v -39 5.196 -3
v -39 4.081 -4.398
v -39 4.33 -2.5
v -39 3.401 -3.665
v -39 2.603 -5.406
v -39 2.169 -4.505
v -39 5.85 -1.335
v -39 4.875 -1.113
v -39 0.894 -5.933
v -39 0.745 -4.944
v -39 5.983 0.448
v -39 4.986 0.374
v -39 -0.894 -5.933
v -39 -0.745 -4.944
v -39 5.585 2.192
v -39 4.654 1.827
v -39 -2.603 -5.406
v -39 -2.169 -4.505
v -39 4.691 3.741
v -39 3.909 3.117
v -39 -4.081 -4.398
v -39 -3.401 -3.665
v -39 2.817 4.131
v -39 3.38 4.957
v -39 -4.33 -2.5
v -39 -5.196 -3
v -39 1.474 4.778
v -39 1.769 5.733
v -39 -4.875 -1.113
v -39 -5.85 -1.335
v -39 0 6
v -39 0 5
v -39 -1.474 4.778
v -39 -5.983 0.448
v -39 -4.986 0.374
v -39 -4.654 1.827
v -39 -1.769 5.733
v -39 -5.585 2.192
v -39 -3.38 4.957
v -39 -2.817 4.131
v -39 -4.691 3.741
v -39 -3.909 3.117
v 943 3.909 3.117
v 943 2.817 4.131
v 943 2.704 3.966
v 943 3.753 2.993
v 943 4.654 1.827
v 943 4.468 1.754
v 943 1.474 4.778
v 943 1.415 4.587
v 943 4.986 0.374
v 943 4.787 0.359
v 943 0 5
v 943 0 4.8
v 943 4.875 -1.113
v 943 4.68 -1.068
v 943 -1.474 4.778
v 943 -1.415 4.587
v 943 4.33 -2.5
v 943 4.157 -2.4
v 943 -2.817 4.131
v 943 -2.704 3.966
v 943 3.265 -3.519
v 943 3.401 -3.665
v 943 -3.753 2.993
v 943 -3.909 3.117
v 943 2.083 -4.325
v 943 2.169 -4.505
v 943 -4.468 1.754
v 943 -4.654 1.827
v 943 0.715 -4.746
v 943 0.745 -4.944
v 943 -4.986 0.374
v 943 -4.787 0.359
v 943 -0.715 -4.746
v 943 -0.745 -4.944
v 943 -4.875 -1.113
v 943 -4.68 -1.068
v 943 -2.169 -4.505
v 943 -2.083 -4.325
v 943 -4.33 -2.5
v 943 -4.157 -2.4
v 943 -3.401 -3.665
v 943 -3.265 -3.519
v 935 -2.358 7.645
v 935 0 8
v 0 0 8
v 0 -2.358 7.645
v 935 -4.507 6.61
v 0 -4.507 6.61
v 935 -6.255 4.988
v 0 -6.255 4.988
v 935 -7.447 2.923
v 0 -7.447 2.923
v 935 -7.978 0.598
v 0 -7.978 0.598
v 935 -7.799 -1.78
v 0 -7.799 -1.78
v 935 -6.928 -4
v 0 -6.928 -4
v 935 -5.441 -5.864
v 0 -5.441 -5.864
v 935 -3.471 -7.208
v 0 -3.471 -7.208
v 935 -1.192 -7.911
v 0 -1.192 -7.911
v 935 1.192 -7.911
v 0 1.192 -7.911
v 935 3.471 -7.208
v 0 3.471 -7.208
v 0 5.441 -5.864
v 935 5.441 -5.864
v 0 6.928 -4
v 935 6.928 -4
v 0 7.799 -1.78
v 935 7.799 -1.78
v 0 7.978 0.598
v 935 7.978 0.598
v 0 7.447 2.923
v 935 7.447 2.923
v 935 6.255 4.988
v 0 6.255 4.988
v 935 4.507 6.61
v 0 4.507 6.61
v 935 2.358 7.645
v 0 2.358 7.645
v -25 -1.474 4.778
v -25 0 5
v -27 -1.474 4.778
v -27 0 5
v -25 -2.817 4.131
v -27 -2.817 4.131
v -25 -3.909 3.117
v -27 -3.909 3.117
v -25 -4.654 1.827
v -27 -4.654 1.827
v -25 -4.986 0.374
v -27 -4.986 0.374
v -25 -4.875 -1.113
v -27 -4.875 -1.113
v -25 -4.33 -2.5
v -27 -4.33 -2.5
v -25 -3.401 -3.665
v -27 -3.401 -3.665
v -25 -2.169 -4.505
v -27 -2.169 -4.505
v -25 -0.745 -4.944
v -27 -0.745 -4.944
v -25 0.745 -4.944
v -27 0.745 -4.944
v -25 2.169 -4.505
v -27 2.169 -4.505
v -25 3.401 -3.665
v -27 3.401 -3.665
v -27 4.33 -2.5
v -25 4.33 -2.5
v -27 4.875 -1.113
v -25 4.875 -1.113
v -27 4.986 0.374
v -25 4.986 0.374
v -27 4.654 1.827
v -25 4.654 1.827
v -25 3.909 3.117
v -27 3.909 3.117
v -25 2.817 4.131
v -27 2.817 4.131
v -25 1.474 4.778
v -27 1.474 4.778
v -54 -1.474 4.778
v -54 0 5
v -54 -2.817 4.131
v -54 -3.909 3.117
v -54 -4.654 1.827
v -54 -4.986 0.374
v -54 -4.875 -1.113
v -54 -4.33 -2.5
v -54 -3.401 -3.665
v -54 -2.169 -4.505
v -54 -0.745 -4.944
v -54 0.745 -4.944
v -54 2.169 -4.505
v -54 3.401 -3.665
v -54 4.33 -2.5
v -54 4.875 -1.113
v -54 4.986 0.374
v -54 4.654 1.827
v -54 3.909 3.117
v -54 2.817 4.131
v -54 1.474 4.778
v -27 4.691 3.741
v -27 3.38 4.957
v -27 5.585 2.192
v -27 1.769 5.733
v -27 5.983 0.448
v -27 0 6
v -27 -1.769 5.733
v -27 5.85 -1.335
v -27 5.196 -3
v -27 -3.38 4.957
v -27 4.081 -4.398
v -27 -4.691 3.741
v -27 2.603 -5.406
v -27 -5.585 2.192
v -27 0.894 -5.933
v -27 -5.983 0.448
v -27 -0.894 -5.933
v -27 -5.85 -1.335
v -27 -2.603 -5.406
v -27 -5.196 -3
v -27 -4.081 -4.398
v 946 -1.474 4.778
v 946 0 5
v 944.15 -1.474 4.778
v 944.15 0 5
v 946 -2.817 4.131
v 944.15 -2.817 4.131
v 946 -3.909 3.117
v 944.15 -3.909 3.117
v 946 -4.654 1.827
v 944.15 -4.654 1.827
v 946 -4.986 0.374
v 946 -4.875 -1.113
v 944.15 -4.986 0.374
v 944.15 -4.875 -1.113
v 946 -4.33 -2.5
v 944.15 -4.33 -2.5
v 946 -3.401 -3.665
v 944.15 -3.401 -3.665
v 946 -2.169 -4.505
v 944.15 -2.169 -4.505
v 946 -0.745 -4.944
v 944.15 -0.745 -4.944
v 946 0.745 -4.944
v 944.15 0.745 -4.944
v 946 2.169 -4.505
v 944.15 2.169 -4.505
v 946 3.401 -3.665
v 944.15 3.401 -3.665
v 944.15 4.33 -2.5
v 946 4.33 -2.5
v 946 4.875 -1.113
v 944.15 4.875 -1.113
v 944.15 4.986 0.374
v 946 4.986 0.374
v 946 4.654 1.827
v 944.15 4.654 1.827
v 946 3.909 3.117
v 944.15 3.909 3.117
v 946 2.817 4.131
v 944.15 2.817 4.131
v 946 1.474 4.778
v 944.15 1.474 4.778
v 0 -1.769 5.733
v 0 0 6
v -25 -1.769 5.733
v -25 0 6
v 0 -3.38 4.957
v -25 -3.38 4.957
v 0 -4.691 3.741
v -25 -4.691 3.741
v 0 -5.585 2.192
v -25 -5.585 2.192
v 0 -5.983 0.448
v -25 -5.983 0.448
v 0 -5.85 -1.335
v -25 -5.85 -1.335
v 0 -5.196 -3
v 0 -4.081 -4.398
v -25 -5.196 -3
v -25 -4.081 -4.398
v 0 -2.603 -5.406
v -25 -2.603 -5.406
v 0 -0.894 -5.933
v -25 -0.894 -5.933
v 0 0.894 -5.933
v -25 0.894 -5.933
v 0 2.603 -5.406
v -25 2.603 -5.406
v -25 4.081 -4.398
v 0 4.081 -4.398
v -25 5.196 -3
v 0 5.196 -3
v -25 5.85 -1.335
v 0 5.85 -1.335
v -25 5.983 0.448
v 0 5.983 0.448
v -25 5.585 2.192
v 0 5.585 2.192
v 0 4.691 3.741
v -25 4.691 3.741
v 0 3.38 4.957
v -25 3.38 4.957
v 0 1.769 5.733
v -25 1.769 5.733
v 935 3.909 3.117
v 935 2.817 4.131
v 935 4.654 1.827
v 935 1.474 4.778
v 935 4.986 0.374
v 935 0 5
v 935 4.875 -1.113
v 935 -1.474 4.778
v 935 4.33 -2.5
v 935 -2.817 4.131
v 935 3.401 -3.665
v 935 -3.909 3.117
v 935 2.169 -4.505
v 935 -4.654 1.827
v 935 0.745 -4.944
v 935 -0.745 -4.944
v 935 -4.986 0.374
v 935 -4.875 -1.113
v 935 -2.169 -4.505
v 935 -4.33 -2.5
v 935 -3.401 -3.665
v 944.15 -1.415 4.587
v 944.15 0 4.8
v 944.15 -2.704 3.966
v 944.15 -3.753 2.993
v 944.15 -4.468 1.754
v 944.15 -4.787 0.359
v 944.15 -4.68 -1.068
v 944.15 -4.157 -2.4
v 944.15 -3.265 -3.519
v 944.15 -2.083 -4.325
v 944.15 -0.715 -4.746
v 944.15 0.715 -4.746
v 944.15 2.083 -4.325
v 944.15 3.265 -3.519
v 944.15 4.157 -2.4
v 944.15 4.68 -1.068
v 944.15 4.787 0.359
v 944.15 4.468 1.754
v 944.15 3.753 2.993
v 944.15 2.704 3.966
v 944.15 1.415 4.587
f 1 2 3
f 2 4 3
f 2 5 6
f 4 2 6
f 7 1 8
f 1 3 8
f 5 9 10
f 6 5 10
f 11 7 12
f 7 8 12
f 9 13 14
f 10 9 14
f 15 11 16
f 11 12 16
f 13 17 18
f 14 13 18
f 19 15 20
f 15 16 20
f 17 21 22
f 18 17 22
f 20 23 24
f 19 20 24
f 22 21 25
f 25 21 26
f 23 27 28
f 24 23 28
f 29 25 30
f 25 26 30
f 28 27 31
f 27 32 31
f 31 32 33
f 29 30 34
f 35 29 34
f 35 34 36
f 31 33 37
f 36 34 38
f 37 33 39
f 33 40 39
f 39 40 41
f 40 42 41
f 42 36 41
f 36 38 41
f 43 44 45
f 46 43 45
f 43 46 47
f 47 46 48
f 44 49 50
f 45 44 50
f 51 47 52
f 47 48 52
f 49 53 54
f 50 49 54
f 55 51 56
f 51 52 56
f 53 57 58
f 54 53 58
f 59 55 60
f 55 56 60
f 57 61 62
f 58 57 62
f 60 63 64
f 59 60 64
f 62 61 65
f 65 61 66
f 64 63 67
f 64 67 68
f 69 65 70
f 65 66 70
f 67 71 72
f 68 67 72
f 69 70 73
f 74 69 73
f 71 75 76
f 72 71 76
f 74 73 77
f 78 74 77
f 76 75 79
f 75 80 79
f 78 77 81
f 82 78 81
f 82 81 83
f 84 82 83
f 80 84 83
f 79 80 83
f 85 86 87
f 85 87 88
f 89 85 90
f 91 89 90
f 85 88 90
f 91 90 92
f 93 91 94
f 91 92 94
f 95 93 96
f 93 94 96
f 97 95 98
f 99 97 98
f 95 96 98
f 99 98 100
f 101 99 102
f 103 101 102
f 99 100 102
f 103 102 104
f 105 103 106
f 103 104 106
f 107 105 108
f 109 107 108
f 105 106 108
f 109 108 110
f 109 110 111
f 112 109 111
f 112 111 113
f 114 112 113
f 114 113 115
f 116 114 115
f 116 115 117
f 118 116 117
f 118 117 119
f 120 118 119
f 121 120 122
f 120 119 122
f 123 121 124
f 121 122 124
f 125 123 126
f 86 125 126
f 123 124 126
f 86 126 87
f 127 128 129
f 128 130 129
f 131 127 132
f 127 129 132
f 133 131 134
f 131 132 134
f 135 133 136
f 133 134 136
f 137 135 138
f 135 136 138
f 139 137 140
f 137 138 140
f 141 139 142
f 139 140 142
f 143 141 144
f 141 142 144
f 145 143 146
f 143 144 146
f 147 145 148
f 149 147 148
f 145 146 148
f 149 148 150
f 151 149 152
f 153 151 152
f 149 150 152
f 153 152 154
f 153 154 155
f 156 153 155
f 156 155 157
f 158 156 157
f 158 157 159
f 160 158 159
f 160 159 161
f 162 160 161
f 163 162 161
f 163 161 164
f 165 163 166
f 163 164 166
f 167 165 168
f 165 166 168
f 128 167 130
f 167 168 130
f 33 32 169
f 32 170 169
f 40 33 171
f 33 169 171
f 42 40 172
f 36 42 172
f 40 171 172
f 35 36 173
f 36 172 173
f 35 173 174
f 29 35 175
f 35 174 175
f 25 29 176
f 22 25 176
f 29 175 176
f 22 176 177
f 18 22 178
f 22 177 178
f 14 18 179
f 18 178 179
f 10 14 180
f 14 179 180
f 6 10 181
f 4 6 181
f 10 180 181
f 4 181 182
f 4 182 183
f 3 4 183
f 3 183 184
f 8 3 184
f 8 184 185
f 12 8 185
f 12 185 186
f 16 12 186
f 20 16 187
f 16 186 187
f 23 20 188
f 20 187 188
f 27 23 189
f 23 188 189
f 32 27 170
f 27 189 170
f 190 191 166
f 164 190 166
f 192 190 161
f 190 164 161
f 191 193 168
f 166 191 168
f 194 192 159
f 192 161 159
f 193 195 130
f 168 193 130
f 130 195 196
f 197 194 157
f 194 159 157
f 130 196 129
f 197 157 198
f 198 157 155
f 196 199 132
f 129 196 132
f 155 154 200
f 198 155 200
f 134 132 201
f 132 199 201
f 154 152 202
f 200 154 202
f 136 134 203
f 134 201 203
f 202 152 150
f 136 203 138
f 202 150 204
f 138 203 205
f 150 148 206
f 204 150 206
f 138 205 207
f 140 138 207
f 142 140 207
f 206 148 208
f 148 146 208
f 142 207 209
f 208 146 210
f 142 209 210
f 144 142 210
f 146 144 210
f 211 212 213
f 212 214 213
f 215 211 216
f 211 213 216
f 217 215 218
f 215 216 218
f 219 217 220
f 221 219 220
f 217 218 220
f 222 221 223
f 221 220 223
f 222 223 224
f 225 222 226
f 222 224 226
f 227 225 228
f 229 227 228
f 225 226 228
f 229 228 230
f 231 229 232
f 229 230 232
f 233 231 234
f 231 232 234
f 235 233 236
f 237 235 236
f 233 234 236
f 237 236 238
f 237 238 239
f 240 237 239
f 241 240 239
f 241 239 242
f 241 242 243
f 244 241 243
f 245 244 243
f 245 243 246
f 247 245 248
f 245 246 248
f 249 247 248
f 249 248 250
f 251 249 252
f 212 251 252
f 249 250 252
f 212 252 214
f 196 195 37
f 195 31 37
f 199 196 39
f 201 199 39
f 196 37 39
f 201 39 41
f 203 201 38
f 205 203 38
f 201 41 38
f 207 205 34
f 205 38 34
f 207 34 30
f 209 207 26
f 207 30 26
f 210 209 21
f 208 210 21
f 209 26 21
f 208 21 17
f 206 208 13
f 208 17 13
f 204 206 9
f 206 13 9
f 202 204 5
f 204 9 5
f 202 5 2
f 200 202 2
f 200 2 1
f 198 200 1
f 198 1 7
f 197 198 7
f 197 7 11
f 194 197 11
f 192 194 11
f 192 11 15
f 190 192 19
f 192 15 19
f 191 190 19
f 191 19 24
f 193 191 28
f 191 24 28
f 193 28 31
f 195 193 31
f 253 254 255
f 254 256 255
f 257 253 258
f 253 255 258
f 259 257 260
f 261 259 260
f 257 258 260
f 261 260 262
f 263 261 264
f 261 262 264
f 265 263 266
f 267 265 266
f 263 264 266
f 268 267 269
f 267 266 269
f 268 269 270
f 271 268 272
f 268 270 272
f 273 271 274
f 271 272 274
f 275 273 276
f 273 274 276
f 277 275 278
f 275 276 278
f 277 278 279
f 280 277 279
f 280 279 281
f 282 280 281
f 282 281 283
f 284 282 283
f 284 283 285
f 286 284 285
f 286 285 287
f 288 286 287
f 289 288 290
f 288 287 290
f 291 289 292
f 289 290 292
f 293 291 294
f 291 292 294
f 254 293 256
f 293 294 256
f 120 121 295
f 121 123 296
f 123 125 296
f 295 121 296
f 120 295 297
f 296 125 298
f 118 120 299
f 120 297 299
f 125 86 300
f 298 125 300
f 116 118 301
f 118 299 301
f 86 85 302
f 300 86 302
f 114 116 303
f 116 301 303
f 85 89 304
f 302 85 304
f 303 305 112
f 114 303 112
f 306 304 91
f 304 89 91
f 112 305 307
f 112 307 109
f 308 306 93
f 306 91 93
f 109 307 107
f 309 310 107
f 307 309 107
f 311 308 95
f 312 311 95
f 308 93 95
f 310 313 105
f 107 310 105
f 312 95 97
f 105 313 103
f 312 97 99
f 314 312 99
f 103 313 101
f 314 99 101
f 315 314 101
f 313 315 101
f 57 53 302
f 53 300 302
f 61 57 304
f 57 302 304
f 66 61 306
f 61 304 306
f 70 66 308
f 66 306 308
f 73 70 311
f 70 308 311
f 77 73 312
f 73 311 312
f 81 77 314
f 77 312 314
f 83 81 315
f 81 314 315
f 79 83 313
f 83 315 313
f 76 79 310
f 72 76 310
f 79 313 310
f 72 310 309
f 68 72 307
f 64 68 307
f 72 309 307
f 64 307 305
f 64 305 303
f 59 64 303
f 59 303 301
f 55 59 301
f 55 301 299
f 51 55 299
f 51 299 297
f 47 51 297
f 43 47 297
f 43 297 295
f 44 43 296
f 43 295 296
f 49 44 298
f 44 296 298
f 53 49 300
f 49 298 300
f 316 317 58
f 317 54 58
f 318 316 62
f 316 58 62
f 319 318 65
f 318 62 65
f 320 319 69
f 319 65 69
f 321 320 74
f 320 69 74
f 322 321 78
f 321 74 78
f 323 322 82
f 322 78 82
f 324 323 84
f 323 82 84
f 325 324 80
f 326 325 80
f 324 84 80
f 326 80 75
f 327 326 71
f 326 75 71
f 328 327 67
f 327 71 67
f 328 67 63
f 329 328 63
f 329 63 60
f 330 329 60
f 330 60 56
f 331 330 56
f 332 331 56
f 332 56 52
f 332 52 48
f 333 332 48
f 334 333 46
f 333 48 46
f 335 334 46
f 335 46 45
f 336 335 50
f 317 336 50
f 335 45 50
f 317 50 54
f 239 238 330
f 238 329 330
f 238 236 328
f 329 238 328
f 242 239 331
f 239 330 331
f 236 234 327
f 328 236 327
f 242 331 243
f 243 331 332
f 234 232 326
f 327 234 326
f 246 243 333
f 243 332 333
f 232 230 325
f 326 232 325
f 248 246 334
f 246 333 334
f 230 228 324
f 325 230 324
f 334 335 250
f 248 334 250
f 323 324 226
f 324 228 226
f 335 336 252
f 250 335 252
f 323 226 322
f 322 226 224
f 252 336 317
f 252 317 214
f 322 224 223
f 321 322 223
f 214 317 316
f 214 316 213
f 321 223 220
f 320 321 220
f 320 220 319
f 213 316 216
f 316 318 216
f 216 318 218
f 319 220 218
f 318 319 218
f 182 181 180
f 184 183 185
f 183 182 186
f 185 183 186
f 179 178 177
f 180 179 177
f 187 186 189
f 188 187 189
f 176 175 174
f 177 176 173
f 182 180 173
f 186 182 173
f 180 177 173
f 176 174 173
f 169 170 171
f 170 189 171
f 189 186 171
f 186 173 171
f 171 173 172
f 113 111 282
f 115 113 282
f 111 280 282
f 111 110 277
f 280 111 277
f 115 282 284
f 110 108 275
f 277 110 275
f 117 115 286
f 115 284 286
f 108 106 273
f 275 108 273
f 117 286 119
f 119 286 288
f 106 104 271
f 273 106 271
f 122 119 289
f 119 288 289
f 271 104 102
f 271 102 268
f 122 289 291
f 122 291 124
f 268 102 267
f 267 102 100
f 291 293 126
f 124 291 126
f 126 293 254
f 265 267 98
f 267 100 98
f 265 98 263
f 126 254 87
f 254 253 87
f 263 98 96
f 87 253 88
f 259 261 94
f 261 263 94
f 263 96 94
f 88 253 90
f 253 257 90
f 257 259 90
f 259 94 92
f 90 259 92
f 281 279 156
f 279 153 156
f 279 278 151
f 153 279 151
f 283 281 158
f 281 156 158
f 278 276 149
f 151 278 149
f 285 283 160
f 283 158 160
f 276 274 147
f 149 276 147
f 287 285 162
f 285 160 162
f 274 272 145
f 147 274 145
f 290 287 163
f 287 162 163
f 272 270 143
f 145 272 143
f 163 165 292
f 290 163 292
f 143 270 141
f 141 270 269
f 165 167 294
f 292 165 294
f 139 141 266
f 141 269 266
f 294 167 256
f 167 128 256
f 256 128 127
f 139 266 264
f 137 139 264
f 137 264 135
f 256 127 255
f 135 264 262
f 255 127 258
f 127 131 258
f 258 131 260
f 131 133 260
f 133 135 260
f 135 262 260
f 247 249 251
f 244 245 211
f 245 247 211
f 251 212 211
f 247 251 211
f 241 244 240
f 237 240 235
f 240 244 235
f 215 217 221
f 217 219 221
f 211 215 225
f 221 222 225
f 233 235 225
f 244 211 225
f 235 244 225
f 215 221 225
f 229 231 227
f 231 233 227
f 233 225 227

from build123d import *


with BuildPart() as part:
    # Sketch1 → Revolve1 (revolve)
    with BuildSketch(Plane.XY, mode=Mode.PRIVATE) as revolve1_sk:
        Polygon((-54, 0), (946, 0), (946, 5), (944.15, 5), (944.15, 4.8), (943, 4.8), (943, 5), (935, 5), (935, 8), (0, 8), (0, 6), (-25, 6), (-25, 5), (-27, 5), (-27, 6), (-39, 6), (-39, 5), (-54, 5), align=None)
    revolve(revolve1_sk.sketch.rotate(Axis((-54, 0, 0), (1, 0, 0)), 90), axis=Axis((-54, 0, 0), (1, 0, 0)))


solid = part.part
